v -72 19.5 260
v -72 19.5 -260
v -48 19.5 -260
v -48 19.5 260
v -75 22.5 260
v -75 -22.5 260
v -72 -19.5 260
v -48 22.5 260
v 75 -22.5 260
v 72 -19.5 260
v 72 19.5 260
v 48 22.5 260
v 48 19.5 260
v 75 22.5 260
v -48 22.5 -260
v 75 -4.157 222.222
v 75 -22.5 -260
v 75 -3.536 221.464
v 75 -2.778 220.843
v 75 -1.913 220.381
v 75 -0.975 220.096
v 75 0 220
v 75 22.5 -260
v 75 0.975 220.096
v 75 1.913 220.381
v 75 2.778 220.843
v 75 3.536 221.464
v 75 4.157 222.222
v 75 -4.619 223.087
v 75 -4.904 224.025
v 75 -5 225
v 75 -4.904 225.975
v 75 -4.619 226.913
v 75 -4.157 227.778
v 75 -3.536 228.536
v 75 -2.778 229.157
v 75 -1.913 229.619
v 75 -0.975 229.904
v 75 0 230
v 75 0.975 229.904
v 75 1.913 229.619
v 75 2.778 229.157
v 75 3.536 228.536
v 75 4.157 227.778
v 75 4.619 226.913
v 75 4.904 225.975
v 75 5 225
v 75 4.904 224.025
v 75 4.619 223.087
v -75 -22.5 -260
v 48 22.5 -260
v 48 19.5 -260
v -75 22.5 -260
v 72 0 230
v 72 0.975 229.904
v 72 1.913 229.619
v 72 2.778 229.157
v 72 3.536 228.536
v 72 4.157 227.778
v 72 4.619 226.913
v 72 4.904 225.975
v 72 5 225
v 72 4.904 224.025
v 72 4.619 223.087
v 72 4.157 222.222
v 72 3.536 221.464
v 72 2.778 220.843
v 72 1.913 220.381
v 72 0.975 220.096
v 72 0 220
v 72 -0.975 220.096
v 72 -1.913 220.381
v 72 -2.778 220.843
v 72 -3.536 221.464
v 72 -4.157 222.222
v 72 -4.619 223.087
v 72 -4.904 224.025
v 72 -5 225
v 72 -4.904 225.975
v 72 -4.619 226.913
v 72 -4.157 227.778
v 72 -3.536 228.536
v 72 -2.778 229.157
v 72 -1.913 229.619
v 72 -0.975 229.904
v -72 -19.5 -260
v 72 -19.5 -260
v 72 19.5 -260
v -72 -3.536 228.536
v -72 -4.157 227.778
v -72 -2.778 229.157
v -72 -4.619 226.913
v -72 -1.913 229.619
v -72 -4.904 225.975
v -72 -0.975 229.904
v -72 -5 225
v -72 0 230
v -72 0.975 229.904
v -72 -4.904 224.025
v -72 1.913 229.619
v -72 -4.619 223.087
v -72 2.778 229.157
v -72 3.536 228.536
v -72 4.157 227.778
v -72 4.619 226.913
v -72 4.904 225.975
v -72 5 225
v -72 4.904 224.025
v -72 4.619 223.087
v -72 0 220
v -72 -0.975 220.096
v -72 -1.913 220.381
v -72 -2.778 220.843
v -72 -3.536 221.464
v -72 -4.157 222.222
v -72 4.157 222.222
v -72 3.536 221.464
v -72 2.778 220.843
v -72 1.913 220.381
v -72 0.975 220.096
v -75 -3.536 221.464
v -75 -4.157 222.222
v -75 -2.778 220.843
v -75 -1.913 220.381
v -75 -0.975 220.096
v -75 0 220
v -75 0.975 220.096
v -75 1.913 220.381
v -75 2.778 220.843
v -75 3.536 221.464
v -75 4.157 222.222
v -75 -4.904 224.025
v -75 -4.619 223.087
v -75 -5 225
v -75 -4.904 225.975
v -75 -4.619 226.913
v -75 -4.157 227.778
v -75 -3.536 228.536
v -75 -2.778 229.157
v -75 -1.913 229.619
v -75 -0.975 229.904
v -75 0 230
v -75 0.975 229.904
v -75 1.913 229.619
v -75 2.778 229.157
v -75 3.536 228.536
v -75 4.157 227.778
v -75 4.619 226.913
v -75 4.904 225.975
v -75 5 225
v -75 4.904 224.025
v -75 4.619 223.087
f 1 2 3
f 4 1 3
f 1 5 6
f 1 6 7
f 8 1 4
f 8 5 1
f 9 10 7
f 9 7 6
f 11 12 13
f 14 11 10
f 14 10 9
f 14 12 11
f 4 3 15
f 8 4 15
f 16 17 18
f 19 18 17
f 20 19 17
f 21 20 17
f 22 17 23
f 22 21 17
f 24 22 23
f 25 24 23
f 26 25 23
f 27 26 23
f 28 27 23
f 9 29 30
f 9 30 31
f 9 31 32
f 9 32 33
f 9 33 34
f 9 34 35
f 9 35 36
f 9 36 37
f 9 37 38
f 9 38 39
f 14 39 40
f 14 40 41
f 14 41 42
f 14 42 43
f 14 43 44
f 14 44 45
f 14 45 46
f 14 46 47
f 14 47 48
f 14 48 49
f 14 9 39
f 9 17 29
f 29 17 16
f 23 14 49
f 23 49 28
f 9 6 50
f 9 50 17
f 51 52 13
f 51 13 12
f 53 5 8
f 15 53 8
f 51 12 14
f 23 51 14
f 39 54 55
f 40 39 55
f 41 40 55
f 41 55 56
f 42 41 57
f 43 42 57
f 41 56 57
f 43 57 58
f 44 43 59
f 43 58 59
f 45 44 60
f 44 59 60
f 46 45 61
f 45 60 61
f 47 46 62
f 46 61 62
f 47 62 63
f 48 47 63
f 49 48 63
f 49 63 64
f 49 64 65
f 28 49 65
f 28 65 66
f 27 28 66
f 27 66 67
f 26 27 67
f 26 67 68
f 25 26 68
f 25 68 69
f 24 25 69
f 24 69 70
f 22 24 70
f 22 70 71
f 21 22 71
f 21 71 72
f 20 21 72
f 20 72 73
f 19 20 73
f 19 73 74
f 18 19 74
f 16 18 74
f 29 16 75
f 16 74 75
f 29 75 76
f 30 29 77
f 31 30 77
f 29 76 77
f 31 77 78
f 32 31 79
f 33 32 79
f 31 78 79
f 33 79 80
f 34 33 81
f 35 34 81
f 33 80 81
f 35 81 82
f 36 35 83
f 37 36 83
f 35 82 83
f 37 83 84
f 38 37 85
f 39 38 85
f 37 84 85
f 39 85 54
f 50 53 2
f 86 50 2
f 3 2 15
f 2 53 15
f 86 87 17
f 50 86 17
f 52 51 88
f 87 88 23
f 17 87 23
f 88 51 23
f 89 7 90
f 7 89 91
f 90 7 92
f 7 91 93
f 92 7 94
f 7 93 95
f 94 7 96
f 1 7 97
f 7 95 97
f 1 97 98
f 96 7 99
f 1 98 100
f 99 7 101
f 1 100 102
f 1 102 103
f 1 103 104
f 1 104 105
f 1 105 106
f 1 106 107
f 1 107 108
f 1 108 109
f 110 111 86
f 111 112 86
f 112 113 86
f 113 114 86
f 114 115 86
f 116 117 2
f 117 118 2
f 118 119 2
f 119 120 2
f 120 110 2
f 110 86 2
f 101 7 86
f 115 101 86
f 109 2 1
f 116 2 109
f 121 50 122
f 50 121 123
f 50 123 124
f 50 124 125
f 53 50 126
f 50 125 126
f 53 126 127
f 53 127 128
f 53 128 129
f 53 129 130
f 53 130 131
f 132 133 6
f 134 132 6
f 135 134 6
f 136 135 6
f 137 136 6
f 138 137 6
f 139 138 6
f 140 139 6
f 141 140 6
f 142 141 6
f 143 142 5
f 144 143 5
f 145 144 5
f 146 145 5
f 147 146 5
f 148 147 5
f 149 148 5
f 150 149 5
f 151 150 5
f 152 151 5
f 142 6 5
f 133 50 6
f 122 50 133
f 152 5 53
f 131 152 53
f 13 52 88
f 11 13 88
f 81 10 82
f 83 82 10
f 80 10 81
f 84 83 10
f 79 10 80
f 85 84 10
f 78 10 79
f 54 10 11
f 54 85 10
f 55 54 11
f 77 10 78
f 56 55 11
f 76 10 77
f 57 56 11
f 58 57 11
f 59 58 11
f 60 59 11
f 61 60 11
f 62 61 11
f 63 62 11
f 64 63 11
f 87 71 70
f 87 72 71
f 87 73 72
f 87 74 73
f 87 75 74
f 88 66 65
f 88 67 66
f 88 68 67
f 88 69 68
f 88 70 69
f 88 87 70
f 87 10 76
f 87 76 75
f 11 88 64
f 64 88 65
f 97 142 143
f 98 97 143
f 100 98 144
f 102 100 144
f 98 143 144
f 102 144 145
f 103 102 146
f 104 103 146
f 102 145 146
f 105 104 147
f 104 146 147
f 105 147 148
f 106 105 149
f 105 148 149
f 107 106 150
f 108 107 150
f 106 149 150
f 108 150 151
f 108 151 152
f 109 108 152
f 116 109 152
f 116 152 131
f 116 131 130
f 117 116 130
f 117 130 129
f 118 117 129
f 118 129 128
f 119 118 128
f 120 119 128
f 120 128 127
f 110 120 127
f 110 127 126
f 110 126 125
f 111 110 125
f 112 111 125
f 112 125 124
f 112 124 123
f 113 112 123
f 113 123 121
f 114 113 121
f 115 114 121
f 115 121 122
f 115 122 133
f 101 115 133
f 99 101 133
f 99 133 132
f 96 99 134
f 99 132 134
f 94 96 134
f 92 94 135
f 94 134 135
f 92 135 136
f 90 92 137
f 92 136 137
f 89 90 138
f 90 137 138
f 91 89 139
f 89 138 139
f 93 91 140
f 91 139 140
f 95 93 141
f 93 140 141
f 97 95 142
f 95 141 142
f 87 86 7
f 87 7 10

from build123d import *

# Parameters (mm, degrees)
SKETCH1_W               = 150
SKETCH1_H               = 45
BOSS_EXTRUDE1_DEPTH     = 260
CUT_EXTRUDE1_DEPTH      = 272.534988537
CUT_EXTRUDE1_DEPTH_BACK = 272.534988537
SKETCH2_W               = 144
SKETCH2_H               = 39
SKETCH3_W               = 96
SKETCH3_H               = 11.757854584
CUT_EXTRUDE2_DEPTH      = 526.862386942
SKETCH4_R               = 5
CUT_EXTRUDE3_DEPTH      = 302.008720804


with BuildPart() as part:
    # Sketch1 → Boss-Extrude1 (new, symmetric)
    with BuildSketch(Plane.XY):
        Rectangle(SKETCH1_W, SKETCH1_H)
    extrude(amount=BOSS_EXTRUDE1_DEPTH, both=True)

    # Sketch2 → Cut-Extrude1 (cut, two sides: drawn at the far end of the back side and taken through both)
    with BuildSketch(Plane.XY.offset(-CUT_EXTRUDE1_DEPTH_BACK)):
        Rectangle(SKETCH2_W, SKETCH2_H)
    extrude(amount=CUT_EXTRUDE1_DEPTH + CUT_EXTRUDE1_DEPTH_BACK, mode=Mode.SUBTRACT)

    # Sketch3 → Cut-Extrude2 (cut, through all)
    with BuildSketch(Plane.XY.offset(260)):
        with Locations((0, 22.5)):
            Rectangle(SKETCH3_W, SKETCH3_H)
    extrude(amount=-CUT_EXTRUDE2_DEPTH, mode=Mode.SUBTRACT)

    # Sketch4 → Cut-Extrude3 (cut, through all)
    with BuildSketch(Plane.ZY.offset(75)):
        with Locations((225, 0)):
            Circle(SKETCH4_R)
    extrude(amount=-CUT_EXTRUDE3_DEPTH, mode=Mode.SUBTRACT)


solid = part.part
